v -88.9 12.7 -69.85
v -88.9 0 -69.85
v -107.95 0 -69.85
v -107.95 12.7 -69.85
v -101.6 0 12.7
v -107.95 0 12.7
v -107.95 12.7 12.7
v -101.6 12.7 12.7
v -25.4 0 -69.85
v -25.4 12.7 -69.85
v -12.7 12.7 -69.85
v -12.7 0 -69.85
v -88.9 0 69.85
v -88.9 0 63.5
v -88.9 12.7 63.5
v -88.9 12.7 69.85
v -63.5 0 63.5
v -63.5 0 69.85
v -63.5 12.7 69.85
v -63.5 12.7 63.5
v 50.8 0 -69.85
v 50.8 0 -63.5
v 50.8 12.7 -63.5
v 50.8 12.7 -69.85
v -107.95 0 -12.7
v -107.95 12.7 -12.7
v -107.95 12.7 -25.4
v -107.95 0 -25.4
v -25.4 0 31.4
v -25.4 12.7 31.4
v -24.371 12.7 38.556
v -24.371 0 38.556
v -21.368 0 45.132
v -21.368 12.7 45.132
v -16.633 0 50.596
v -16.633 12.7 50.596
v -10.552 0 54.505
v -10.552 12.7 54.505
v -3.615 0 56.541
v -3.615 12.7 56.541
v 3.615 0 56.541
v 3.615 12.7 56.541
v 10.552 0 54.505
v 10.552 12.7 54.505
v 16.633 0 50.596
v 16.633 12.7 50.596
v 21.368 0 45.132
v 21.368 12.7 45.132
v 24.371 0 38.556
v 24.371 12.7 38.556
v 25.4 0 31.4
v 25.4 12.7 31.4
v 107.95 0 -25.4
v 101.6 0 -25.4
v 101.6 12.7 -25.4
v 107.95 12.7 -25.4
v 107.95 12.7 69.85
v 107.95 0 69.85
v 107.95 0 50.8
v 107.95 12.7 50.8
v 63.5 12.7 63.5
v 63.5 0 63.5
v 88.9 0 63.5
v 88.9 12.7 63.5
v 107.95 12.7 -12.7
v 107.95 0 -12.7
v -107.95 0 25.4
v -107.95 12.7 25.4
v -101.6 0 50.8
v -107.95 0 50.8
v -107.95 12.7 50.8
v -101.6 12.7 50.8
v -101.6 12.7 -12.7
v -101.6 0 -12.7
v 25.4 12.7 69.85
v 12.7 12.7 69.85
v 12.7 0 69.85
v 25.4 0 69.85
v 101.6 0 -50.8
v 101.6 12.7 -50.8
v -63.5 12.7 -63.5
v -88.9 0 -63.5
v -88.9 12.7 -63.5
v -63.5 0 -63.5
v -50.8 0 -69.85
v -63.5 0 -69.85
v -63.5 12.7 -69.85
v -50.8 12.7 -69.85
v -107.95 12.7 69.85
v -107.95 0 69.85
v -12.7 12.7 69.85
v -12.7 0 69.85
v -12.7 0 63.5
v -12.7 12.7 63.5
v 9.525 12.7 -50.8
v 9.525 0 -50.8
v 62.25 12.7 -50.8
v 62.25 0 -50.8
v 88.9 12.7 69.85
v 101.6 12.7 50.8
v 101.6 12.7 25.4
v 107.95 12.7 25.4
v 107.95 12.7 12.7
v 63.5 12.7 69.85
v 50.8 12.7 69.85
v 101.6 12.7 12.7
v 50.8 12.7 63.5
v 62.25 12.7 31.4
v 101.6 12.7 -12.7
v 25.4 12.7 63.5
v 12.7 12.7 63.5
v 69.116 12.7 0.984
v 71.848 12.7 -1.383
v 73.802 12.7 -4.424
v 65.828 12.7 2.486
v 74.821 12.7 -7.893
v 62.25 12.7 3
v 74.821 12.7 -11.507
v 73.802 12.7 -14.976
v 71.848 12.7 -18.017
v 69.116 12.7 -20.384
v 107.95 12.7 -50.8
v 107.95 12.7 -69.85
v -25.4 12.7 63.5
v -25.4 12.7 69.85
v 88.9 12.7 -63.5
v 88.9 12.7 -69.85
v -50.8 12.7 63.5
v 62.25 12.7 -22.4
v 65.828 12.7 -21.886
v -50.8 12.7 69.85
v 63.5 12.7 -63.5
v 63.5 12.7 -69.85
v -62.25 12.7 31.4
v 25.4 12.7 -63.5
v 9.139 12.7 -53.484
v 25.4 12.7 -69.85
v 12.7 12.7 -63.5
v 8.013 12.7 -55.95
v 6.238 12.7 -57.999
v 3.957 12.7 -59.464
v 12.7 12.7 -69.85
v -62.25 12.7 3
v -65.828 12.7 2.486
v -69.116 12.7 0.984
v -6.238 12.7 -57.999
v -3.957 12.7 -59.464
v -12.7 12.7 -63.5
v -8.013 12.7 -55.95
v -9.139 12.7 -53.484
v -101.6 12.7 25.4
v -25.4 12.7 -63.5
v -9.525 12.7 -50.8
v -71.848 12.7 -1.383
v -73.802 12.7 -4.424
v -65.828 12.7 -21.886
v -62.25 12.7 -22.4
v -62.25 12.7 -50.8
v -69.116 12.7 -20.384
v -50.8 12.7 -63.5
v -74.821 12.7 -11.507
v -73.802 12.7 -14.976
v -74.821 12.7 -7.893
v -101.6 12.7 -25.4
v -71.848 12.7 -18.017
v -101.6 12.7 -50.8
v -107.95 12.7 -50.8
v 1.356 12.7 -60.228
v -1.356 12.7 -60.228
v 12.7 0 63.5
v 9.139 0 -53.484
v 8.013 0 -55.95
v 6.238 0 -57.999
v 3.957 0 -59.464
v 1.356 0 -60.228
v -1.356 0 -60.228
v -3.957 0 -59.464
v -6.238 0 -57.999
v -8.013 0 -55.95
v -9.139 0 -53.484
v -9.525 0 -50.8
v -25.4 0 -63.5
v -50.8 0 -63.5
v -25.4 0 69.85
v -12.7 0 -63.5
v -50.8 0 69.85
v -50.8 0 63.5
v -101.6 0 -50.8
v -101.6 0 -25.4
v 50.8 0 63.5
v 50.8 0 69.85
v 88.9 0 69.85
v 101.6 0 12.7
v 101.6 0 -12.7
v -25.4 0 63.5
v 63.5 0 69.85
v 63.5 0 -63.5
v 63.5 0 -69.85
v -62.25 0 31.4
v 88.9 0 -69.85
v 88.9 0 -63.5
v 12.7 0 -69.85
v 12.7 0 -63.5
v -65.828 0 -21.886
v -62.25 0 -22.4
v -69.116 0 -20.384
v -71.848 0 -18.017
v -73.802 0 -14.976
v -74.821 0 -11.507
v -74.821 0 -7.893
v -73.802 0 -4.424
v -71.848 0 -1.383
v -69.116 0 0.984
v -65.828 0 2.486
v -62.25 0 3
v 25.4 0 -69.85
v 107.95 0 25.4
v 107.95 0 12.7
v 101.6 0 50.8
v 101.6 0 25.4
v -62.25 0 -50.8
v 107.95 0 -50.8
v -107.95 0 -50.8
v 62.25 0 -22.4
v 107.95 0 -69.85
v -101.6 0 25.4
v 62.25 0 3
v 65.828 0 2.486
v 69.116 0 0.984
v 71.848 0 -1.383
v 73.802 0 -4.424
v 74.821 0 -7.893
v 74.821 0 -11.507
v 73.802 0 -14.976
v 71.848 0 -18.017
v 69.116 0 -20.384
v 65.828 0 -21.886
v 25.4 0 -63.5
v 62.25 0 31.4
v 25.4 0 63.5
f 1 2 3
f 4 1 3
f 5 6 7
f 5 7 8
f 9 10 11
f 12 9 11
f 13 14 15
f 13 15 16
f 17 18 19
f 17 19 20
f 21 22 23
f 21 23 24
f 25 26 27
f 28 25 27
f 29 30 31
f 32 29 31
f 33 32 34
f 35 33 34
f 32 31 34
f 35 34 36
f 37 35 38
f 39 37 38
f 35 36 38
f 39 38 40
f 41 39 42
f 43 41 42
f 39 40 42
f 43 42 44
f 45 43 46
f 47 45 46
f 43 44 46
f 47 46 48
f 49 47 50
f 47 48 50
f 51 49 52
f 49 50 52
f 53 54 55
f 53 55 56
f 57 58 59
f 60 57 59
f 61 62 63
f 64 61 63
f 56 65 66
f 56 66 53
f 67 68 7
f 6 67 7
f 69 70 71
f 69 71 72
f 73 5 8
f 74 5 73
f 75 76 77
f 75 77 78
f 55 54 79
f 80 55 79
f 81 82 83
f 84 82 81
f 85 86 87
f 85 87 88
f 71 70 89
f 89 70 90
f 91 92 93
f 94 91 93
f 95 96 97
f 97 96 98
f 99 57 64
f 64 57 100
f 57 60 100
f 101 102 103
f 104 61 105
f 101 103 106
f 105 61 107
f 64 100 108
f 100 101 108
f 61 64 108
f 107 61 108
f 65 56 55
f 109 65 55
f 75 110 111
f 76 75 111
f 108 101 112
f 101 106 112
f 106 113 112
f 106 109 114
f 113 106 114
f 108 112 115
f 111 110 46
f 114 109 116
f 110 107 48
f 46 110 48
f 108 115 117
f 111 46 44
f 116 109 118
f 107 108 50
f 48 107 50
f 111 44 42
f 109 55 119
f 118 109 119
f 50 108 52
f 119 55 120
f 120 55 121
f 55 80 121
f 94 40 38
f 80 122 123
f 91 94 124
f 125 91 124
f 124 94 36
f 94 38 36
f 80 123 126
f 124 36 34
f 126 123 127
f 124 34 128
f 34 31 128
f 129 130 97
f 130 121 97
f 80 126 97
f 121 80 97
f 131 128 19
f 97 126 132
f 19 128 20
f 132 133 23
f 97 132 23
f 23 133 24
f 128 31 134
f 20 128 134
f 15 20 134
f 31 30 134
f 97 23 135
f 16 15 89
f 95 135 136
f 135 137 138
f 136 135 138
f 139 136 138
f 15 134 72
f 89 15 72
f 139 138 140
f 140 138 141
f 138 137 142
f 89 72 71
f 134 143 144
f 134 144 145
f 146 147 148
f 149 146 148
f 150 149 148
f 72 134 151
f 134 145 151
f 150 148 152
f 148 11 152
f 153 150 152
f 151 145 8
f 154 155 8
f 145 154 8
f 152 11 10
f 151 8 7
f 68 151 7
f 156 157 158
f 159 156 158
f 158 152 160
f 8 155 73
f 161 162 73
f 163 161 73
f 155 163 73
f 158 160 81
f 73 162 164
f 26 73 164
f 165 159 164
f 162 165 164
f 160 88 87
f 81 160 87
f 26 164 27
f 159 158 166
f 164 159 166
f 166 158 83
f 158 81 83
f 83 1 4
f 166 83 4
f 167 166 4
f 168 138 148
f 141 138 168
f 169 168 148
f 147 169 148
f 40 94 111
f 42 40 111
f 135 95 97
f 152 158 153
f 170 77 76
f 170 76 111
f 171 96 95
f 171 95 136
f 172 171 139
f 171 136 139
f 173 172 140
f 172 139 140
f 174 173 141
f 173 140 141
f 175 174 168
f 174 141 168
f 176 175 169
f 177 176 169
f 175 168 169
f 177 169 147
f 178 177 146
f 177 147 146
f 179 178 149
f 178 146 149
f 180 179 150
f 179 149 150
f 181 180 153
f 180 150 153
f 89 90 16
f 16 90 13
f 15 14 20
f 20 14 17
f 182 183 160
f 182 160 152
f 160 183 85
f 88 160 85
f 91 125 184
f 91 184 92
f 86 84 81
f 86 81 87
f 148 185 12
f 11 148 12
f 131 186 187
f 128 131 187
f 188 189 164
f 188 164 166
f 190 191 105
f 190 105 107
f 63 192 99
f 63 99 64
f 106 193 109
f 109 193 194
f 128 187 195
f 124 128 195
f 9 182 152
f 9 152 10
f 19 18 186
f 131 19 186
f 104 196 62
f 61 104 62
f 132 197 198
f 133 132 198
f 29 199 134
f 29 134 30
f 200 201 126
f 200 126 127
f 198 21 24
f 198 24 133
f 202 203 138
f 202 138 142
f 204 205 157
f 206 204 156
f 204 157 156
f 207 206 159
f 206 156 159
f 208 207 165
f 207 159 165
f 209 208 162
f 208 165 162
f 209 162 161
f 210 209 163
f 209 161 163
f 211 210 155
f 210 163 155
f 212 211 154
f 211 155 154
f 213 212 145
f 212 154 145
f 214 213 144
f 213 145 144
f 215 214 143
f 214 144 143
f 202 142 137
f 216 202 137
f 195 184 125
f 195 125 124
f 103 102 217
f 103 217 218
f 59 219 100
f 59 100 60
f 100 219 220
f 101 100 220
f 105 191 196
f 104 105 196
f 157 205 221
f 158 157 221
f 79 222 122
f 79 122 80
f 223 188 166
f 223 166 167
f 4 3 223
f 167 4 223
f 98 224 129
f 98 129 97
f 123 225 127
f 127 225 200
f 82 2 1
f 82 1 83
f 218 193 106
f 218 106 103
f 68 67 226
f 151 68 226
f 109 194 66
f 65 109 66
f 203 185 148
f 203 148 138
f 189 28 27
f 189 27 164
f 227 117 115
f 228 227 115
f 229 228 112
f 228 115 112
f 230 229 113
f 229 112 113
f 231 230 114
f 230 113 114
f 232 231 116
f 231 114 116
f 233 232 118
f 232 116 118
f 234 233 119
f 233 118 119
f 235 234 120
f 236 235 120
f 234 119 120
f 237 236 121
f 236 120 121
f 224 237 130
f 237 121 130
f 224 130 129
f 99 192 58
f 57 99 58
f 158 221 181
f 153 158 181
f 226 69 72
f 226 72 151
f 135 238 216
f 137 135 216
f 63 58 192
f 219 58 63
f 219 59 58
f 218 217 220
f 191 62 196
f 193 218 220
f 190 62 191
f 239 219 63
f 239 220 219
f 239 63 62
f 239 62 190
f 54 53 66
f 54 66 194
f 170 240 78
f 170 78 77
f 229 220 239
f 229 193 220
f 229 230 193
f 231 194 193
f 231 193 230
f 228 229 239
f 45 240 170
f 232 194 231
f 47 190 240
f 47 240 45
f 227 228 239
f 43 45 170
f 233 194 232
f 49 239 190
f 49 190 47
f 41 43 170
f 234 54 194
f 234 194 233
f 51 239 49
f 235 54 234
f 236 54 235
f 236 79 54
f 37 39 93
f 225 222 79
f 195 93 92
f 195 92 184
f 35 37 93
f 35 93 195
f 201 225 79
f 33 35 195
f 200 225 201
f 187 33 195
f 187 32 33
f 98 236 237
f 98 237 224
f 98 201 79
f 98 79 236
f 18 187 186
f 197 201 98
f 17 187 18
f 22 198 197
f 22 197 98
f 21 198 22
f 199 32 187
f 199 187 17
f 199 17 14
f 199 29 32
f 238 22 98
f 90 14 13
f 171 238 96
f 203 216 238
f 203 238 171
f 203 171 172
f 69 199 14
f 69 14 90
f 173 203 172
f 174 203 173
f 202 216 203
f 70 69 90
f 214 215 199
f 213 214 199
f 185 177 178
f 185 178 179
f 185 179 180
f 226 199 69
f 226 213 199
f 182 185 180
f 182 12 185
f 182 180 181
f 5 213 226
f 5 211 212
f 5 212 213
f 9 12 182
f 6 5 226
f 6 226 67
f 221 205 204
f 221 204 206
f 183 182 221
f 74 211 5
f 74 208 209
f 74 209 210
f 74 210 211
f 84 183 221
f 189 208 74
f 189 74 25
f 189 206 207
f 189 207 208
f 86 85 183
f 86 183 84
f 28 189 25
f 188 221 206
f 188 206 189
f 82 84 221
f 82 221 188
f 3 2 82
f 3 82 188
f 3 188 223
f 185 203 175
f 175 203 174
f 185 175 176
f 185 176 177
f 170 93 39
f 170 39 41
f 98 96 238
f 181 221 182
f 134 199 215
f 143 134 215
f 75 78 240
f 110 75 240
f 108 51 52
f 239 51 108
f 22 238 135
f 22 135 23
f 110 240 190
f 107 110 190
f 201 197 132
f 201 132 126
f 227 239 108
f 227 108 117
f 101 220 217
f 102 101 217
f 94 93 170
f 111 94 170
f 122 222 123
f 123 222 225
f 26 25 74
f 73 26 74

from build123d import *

# Parameters (mm, degrees)
SKETCH7_W           = 203.2
SKETCH7_H           = 127
SKETCH7_W_2         = 124.5
SKETCH7_H_2         = 82.199999938
BOSS_EXTRUDE4_DEPTH = 12.7
SKETCH8_W           = 12.7
SKETCH8_H           = 6.35
SKETCH8_W_2         = 6.35
SKETCH8_H_2         = 12.7
BOSS_EXTRUDE5_DEPTH = 12.7
SKETCH10_R          = 9.525
SKETCH10_R_2        = 12.7
SKETCH10_R_3        = 25.4
CUT_EXTRUDE1_DEPTH  = 130.203386179


with BuildPart() as part:
    # Sketch7 → Boss-Extrude4 (new body)
    with BuildSketch(Plane(origin=(0, 0, 0), x_dir=(1, 0, 0), z_dir=(0, 1, 0))):
        Rectangle(SKETCH7_W, SKETCH7_H)
        with Locations((0, 9.700000031)):
            Rectangle(SKETCH7_W_2, SKETCH7_H_2, mode=Mode.SUBTRACT)
    extrude(amount=BOSS_EXTRUDE4_DEPTH)

    # Sketch8 → Boss-Extrude5 (add)
    with BuildSketch(Plane(origin=(0, 0, 0), x_dir=(1, 0, 0), z_dir=(0, 1, 0))):
        Polygon((-101.6, 69.85), (-88.9, 69.85), (-88.9, 63.5), (-101.6, 50.8), (-107.95, 50.8), (-107.95, 63.5), (-107.95, 69.85), align=None)
        with Locations((-57.15, 66.675)):
            Rectangle(SKETCH8_W, SKETCH8_H)
        with Locations((-19.05, 66.675)):
            Rectangle(SKETCH8_W, SKETCH8_H)
        with Locations((19.05, 66.675)):
            Rectangle(SKETCH8_W, SKETCH8_H)
        with Locations((57.15, 66.675)):
            Rectangle(SKETCH8_W, SKETCH8_H)
        with Locations((-104.775, 19.05)):
            Rectangle(SKETCH8_W_2, SKETCH8_H_2)
        with Locations((-104.775, -19.05)):
            Rectangle(SKETCH8_W_2, SKETCH8_H_2)
        Polygon((-101.6, -50.8), (-88.9, -63.5), (-88.9, -69.85), (-101.6, -69.85), (-107.95, -69.85), (-107.95, -63.5), (-107.95, -50.8), align=None)
        Polygon((101.6, 50.8), (88.9, 63.5), (88.9, 69.85), (101.6, 69.85), (107.95, 69.85), (107.95, 63.5), (107.95, 50.8), align=None)
        Polygon((101.6, -69.85), (88.9, -69.85), (88.9, -63.5), (101.6, -50.8), (107.95, -50.8), (107.95, -63.5), (107.95, -69.85), align=None)
        with Locations((104.775, -19.05)):
            Rectangle(SKETCH8_W_2, SKETCH8_H_2)
        with Locations((104.775, 19.05)):
            Rectangle(SKETCH8_W_2, SKETCH8_H_2)
        with Locations((57.15, -66.675)):
            Rectangle(SKETCH8_W, SKETCH8_H)
        with Locations((19.05, -66.675)):
            Rectangle(SKETCH8_W, SKETCH8_H)
        with Locations((-19.05, -66.675)):
            Rectangle(SKETCH8_W, SKETCH8_H)
        with Locations((-57.15, -66.675)):
            Rectangle(SKETCH8_W, SKETCH8_H)
    extrude(amount=BOSS_EXTRUDE5_DEPTH)

    # Sketch10 → Cut-Extrude1 (cut, through all)
    with BuildSketch(Plane(origin=(0, 12.7, 0), x_dir=(1, 0, 0), z_dir=(0, 1, 0))):
        with Locations((0, 50.8)):
            Circle(SKETCH10_R)
        with Locations((-62.25, 9.700000031)):
            Circle(SKETCH10_R_2)
        with Locations((0, -31.399999938)):
            Circle(SKETCH10_R_3)
        with Locations((62.25, 9.700000031)):
            Circle(SKETCH10_R_2)
    extrude(amount=-CUT_EXTRUDE1_DEPTH, mode=Mode.SUBTRACT)


solid = part.part
